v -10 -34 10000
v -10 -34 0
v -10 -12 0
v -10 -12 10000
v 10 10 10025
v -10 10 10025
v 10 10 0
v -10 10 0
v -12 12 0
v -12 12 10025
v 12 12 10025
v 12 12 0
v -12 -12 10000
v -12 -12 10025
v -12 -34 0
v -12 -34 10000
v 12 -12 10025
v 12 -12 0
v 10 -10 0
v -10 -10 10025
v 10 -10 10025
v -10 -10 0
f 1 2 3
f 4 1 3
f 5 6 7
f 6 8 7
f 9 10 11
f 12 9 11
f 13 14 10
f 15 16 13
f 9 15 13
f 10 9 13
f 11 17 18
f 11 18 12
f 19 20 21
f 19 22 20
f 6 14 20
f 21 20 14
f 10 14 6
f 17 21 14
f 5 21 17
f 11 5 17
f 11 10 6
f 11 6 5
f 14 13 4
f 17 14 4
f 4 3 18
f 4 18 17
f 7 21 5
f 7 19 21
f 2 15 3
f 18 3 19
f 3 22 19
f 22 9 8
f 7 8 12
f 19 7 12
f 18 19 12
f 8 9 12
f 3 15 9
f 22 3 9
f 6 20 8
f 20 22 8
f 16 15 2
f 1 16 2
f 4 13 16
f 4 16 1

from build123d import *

# Parameters (mm, degrees)
F0_W     = 24
F0_H     = 24
F1_DEPTH = 10000
F2_DEPTH = 25
F3_T     = -2
F4_W     = 2
F4_H     = 22
F5_DEPTH = 10000


with BuildPart() as f1:
    # F0 (on Top) → F1 (new body)
    with BuildSketch(Plane.XY):
        Rectangle(F0_W, F0_H)
    extrude(amount=F1_DEPTH)

    # F2 (add): a face of the model
    f2_faces = [f1.faces().sort_by_distance(p)[0] for p in [
        (0, 0, 10000),
    ]]
    extrude(f2_faces, amount=F2_DEPTH)

    # F3
    f3_openings = [f1.faces().sort_by_distance(p)[0] for p in [
        (0, 0, 10025),
        (0, 0, 0),
    ]]
    offset(amount=F3_T, openings=f3_openings)

    # F4 (on Top) → F5 (join)
    with BuildSketch(Plane.XY):
        with Locations((-11, -23)):
            Rectangle(F4_W, F4_H)
    extrude(amount=F5_DEPTH)


solid = f1.part
